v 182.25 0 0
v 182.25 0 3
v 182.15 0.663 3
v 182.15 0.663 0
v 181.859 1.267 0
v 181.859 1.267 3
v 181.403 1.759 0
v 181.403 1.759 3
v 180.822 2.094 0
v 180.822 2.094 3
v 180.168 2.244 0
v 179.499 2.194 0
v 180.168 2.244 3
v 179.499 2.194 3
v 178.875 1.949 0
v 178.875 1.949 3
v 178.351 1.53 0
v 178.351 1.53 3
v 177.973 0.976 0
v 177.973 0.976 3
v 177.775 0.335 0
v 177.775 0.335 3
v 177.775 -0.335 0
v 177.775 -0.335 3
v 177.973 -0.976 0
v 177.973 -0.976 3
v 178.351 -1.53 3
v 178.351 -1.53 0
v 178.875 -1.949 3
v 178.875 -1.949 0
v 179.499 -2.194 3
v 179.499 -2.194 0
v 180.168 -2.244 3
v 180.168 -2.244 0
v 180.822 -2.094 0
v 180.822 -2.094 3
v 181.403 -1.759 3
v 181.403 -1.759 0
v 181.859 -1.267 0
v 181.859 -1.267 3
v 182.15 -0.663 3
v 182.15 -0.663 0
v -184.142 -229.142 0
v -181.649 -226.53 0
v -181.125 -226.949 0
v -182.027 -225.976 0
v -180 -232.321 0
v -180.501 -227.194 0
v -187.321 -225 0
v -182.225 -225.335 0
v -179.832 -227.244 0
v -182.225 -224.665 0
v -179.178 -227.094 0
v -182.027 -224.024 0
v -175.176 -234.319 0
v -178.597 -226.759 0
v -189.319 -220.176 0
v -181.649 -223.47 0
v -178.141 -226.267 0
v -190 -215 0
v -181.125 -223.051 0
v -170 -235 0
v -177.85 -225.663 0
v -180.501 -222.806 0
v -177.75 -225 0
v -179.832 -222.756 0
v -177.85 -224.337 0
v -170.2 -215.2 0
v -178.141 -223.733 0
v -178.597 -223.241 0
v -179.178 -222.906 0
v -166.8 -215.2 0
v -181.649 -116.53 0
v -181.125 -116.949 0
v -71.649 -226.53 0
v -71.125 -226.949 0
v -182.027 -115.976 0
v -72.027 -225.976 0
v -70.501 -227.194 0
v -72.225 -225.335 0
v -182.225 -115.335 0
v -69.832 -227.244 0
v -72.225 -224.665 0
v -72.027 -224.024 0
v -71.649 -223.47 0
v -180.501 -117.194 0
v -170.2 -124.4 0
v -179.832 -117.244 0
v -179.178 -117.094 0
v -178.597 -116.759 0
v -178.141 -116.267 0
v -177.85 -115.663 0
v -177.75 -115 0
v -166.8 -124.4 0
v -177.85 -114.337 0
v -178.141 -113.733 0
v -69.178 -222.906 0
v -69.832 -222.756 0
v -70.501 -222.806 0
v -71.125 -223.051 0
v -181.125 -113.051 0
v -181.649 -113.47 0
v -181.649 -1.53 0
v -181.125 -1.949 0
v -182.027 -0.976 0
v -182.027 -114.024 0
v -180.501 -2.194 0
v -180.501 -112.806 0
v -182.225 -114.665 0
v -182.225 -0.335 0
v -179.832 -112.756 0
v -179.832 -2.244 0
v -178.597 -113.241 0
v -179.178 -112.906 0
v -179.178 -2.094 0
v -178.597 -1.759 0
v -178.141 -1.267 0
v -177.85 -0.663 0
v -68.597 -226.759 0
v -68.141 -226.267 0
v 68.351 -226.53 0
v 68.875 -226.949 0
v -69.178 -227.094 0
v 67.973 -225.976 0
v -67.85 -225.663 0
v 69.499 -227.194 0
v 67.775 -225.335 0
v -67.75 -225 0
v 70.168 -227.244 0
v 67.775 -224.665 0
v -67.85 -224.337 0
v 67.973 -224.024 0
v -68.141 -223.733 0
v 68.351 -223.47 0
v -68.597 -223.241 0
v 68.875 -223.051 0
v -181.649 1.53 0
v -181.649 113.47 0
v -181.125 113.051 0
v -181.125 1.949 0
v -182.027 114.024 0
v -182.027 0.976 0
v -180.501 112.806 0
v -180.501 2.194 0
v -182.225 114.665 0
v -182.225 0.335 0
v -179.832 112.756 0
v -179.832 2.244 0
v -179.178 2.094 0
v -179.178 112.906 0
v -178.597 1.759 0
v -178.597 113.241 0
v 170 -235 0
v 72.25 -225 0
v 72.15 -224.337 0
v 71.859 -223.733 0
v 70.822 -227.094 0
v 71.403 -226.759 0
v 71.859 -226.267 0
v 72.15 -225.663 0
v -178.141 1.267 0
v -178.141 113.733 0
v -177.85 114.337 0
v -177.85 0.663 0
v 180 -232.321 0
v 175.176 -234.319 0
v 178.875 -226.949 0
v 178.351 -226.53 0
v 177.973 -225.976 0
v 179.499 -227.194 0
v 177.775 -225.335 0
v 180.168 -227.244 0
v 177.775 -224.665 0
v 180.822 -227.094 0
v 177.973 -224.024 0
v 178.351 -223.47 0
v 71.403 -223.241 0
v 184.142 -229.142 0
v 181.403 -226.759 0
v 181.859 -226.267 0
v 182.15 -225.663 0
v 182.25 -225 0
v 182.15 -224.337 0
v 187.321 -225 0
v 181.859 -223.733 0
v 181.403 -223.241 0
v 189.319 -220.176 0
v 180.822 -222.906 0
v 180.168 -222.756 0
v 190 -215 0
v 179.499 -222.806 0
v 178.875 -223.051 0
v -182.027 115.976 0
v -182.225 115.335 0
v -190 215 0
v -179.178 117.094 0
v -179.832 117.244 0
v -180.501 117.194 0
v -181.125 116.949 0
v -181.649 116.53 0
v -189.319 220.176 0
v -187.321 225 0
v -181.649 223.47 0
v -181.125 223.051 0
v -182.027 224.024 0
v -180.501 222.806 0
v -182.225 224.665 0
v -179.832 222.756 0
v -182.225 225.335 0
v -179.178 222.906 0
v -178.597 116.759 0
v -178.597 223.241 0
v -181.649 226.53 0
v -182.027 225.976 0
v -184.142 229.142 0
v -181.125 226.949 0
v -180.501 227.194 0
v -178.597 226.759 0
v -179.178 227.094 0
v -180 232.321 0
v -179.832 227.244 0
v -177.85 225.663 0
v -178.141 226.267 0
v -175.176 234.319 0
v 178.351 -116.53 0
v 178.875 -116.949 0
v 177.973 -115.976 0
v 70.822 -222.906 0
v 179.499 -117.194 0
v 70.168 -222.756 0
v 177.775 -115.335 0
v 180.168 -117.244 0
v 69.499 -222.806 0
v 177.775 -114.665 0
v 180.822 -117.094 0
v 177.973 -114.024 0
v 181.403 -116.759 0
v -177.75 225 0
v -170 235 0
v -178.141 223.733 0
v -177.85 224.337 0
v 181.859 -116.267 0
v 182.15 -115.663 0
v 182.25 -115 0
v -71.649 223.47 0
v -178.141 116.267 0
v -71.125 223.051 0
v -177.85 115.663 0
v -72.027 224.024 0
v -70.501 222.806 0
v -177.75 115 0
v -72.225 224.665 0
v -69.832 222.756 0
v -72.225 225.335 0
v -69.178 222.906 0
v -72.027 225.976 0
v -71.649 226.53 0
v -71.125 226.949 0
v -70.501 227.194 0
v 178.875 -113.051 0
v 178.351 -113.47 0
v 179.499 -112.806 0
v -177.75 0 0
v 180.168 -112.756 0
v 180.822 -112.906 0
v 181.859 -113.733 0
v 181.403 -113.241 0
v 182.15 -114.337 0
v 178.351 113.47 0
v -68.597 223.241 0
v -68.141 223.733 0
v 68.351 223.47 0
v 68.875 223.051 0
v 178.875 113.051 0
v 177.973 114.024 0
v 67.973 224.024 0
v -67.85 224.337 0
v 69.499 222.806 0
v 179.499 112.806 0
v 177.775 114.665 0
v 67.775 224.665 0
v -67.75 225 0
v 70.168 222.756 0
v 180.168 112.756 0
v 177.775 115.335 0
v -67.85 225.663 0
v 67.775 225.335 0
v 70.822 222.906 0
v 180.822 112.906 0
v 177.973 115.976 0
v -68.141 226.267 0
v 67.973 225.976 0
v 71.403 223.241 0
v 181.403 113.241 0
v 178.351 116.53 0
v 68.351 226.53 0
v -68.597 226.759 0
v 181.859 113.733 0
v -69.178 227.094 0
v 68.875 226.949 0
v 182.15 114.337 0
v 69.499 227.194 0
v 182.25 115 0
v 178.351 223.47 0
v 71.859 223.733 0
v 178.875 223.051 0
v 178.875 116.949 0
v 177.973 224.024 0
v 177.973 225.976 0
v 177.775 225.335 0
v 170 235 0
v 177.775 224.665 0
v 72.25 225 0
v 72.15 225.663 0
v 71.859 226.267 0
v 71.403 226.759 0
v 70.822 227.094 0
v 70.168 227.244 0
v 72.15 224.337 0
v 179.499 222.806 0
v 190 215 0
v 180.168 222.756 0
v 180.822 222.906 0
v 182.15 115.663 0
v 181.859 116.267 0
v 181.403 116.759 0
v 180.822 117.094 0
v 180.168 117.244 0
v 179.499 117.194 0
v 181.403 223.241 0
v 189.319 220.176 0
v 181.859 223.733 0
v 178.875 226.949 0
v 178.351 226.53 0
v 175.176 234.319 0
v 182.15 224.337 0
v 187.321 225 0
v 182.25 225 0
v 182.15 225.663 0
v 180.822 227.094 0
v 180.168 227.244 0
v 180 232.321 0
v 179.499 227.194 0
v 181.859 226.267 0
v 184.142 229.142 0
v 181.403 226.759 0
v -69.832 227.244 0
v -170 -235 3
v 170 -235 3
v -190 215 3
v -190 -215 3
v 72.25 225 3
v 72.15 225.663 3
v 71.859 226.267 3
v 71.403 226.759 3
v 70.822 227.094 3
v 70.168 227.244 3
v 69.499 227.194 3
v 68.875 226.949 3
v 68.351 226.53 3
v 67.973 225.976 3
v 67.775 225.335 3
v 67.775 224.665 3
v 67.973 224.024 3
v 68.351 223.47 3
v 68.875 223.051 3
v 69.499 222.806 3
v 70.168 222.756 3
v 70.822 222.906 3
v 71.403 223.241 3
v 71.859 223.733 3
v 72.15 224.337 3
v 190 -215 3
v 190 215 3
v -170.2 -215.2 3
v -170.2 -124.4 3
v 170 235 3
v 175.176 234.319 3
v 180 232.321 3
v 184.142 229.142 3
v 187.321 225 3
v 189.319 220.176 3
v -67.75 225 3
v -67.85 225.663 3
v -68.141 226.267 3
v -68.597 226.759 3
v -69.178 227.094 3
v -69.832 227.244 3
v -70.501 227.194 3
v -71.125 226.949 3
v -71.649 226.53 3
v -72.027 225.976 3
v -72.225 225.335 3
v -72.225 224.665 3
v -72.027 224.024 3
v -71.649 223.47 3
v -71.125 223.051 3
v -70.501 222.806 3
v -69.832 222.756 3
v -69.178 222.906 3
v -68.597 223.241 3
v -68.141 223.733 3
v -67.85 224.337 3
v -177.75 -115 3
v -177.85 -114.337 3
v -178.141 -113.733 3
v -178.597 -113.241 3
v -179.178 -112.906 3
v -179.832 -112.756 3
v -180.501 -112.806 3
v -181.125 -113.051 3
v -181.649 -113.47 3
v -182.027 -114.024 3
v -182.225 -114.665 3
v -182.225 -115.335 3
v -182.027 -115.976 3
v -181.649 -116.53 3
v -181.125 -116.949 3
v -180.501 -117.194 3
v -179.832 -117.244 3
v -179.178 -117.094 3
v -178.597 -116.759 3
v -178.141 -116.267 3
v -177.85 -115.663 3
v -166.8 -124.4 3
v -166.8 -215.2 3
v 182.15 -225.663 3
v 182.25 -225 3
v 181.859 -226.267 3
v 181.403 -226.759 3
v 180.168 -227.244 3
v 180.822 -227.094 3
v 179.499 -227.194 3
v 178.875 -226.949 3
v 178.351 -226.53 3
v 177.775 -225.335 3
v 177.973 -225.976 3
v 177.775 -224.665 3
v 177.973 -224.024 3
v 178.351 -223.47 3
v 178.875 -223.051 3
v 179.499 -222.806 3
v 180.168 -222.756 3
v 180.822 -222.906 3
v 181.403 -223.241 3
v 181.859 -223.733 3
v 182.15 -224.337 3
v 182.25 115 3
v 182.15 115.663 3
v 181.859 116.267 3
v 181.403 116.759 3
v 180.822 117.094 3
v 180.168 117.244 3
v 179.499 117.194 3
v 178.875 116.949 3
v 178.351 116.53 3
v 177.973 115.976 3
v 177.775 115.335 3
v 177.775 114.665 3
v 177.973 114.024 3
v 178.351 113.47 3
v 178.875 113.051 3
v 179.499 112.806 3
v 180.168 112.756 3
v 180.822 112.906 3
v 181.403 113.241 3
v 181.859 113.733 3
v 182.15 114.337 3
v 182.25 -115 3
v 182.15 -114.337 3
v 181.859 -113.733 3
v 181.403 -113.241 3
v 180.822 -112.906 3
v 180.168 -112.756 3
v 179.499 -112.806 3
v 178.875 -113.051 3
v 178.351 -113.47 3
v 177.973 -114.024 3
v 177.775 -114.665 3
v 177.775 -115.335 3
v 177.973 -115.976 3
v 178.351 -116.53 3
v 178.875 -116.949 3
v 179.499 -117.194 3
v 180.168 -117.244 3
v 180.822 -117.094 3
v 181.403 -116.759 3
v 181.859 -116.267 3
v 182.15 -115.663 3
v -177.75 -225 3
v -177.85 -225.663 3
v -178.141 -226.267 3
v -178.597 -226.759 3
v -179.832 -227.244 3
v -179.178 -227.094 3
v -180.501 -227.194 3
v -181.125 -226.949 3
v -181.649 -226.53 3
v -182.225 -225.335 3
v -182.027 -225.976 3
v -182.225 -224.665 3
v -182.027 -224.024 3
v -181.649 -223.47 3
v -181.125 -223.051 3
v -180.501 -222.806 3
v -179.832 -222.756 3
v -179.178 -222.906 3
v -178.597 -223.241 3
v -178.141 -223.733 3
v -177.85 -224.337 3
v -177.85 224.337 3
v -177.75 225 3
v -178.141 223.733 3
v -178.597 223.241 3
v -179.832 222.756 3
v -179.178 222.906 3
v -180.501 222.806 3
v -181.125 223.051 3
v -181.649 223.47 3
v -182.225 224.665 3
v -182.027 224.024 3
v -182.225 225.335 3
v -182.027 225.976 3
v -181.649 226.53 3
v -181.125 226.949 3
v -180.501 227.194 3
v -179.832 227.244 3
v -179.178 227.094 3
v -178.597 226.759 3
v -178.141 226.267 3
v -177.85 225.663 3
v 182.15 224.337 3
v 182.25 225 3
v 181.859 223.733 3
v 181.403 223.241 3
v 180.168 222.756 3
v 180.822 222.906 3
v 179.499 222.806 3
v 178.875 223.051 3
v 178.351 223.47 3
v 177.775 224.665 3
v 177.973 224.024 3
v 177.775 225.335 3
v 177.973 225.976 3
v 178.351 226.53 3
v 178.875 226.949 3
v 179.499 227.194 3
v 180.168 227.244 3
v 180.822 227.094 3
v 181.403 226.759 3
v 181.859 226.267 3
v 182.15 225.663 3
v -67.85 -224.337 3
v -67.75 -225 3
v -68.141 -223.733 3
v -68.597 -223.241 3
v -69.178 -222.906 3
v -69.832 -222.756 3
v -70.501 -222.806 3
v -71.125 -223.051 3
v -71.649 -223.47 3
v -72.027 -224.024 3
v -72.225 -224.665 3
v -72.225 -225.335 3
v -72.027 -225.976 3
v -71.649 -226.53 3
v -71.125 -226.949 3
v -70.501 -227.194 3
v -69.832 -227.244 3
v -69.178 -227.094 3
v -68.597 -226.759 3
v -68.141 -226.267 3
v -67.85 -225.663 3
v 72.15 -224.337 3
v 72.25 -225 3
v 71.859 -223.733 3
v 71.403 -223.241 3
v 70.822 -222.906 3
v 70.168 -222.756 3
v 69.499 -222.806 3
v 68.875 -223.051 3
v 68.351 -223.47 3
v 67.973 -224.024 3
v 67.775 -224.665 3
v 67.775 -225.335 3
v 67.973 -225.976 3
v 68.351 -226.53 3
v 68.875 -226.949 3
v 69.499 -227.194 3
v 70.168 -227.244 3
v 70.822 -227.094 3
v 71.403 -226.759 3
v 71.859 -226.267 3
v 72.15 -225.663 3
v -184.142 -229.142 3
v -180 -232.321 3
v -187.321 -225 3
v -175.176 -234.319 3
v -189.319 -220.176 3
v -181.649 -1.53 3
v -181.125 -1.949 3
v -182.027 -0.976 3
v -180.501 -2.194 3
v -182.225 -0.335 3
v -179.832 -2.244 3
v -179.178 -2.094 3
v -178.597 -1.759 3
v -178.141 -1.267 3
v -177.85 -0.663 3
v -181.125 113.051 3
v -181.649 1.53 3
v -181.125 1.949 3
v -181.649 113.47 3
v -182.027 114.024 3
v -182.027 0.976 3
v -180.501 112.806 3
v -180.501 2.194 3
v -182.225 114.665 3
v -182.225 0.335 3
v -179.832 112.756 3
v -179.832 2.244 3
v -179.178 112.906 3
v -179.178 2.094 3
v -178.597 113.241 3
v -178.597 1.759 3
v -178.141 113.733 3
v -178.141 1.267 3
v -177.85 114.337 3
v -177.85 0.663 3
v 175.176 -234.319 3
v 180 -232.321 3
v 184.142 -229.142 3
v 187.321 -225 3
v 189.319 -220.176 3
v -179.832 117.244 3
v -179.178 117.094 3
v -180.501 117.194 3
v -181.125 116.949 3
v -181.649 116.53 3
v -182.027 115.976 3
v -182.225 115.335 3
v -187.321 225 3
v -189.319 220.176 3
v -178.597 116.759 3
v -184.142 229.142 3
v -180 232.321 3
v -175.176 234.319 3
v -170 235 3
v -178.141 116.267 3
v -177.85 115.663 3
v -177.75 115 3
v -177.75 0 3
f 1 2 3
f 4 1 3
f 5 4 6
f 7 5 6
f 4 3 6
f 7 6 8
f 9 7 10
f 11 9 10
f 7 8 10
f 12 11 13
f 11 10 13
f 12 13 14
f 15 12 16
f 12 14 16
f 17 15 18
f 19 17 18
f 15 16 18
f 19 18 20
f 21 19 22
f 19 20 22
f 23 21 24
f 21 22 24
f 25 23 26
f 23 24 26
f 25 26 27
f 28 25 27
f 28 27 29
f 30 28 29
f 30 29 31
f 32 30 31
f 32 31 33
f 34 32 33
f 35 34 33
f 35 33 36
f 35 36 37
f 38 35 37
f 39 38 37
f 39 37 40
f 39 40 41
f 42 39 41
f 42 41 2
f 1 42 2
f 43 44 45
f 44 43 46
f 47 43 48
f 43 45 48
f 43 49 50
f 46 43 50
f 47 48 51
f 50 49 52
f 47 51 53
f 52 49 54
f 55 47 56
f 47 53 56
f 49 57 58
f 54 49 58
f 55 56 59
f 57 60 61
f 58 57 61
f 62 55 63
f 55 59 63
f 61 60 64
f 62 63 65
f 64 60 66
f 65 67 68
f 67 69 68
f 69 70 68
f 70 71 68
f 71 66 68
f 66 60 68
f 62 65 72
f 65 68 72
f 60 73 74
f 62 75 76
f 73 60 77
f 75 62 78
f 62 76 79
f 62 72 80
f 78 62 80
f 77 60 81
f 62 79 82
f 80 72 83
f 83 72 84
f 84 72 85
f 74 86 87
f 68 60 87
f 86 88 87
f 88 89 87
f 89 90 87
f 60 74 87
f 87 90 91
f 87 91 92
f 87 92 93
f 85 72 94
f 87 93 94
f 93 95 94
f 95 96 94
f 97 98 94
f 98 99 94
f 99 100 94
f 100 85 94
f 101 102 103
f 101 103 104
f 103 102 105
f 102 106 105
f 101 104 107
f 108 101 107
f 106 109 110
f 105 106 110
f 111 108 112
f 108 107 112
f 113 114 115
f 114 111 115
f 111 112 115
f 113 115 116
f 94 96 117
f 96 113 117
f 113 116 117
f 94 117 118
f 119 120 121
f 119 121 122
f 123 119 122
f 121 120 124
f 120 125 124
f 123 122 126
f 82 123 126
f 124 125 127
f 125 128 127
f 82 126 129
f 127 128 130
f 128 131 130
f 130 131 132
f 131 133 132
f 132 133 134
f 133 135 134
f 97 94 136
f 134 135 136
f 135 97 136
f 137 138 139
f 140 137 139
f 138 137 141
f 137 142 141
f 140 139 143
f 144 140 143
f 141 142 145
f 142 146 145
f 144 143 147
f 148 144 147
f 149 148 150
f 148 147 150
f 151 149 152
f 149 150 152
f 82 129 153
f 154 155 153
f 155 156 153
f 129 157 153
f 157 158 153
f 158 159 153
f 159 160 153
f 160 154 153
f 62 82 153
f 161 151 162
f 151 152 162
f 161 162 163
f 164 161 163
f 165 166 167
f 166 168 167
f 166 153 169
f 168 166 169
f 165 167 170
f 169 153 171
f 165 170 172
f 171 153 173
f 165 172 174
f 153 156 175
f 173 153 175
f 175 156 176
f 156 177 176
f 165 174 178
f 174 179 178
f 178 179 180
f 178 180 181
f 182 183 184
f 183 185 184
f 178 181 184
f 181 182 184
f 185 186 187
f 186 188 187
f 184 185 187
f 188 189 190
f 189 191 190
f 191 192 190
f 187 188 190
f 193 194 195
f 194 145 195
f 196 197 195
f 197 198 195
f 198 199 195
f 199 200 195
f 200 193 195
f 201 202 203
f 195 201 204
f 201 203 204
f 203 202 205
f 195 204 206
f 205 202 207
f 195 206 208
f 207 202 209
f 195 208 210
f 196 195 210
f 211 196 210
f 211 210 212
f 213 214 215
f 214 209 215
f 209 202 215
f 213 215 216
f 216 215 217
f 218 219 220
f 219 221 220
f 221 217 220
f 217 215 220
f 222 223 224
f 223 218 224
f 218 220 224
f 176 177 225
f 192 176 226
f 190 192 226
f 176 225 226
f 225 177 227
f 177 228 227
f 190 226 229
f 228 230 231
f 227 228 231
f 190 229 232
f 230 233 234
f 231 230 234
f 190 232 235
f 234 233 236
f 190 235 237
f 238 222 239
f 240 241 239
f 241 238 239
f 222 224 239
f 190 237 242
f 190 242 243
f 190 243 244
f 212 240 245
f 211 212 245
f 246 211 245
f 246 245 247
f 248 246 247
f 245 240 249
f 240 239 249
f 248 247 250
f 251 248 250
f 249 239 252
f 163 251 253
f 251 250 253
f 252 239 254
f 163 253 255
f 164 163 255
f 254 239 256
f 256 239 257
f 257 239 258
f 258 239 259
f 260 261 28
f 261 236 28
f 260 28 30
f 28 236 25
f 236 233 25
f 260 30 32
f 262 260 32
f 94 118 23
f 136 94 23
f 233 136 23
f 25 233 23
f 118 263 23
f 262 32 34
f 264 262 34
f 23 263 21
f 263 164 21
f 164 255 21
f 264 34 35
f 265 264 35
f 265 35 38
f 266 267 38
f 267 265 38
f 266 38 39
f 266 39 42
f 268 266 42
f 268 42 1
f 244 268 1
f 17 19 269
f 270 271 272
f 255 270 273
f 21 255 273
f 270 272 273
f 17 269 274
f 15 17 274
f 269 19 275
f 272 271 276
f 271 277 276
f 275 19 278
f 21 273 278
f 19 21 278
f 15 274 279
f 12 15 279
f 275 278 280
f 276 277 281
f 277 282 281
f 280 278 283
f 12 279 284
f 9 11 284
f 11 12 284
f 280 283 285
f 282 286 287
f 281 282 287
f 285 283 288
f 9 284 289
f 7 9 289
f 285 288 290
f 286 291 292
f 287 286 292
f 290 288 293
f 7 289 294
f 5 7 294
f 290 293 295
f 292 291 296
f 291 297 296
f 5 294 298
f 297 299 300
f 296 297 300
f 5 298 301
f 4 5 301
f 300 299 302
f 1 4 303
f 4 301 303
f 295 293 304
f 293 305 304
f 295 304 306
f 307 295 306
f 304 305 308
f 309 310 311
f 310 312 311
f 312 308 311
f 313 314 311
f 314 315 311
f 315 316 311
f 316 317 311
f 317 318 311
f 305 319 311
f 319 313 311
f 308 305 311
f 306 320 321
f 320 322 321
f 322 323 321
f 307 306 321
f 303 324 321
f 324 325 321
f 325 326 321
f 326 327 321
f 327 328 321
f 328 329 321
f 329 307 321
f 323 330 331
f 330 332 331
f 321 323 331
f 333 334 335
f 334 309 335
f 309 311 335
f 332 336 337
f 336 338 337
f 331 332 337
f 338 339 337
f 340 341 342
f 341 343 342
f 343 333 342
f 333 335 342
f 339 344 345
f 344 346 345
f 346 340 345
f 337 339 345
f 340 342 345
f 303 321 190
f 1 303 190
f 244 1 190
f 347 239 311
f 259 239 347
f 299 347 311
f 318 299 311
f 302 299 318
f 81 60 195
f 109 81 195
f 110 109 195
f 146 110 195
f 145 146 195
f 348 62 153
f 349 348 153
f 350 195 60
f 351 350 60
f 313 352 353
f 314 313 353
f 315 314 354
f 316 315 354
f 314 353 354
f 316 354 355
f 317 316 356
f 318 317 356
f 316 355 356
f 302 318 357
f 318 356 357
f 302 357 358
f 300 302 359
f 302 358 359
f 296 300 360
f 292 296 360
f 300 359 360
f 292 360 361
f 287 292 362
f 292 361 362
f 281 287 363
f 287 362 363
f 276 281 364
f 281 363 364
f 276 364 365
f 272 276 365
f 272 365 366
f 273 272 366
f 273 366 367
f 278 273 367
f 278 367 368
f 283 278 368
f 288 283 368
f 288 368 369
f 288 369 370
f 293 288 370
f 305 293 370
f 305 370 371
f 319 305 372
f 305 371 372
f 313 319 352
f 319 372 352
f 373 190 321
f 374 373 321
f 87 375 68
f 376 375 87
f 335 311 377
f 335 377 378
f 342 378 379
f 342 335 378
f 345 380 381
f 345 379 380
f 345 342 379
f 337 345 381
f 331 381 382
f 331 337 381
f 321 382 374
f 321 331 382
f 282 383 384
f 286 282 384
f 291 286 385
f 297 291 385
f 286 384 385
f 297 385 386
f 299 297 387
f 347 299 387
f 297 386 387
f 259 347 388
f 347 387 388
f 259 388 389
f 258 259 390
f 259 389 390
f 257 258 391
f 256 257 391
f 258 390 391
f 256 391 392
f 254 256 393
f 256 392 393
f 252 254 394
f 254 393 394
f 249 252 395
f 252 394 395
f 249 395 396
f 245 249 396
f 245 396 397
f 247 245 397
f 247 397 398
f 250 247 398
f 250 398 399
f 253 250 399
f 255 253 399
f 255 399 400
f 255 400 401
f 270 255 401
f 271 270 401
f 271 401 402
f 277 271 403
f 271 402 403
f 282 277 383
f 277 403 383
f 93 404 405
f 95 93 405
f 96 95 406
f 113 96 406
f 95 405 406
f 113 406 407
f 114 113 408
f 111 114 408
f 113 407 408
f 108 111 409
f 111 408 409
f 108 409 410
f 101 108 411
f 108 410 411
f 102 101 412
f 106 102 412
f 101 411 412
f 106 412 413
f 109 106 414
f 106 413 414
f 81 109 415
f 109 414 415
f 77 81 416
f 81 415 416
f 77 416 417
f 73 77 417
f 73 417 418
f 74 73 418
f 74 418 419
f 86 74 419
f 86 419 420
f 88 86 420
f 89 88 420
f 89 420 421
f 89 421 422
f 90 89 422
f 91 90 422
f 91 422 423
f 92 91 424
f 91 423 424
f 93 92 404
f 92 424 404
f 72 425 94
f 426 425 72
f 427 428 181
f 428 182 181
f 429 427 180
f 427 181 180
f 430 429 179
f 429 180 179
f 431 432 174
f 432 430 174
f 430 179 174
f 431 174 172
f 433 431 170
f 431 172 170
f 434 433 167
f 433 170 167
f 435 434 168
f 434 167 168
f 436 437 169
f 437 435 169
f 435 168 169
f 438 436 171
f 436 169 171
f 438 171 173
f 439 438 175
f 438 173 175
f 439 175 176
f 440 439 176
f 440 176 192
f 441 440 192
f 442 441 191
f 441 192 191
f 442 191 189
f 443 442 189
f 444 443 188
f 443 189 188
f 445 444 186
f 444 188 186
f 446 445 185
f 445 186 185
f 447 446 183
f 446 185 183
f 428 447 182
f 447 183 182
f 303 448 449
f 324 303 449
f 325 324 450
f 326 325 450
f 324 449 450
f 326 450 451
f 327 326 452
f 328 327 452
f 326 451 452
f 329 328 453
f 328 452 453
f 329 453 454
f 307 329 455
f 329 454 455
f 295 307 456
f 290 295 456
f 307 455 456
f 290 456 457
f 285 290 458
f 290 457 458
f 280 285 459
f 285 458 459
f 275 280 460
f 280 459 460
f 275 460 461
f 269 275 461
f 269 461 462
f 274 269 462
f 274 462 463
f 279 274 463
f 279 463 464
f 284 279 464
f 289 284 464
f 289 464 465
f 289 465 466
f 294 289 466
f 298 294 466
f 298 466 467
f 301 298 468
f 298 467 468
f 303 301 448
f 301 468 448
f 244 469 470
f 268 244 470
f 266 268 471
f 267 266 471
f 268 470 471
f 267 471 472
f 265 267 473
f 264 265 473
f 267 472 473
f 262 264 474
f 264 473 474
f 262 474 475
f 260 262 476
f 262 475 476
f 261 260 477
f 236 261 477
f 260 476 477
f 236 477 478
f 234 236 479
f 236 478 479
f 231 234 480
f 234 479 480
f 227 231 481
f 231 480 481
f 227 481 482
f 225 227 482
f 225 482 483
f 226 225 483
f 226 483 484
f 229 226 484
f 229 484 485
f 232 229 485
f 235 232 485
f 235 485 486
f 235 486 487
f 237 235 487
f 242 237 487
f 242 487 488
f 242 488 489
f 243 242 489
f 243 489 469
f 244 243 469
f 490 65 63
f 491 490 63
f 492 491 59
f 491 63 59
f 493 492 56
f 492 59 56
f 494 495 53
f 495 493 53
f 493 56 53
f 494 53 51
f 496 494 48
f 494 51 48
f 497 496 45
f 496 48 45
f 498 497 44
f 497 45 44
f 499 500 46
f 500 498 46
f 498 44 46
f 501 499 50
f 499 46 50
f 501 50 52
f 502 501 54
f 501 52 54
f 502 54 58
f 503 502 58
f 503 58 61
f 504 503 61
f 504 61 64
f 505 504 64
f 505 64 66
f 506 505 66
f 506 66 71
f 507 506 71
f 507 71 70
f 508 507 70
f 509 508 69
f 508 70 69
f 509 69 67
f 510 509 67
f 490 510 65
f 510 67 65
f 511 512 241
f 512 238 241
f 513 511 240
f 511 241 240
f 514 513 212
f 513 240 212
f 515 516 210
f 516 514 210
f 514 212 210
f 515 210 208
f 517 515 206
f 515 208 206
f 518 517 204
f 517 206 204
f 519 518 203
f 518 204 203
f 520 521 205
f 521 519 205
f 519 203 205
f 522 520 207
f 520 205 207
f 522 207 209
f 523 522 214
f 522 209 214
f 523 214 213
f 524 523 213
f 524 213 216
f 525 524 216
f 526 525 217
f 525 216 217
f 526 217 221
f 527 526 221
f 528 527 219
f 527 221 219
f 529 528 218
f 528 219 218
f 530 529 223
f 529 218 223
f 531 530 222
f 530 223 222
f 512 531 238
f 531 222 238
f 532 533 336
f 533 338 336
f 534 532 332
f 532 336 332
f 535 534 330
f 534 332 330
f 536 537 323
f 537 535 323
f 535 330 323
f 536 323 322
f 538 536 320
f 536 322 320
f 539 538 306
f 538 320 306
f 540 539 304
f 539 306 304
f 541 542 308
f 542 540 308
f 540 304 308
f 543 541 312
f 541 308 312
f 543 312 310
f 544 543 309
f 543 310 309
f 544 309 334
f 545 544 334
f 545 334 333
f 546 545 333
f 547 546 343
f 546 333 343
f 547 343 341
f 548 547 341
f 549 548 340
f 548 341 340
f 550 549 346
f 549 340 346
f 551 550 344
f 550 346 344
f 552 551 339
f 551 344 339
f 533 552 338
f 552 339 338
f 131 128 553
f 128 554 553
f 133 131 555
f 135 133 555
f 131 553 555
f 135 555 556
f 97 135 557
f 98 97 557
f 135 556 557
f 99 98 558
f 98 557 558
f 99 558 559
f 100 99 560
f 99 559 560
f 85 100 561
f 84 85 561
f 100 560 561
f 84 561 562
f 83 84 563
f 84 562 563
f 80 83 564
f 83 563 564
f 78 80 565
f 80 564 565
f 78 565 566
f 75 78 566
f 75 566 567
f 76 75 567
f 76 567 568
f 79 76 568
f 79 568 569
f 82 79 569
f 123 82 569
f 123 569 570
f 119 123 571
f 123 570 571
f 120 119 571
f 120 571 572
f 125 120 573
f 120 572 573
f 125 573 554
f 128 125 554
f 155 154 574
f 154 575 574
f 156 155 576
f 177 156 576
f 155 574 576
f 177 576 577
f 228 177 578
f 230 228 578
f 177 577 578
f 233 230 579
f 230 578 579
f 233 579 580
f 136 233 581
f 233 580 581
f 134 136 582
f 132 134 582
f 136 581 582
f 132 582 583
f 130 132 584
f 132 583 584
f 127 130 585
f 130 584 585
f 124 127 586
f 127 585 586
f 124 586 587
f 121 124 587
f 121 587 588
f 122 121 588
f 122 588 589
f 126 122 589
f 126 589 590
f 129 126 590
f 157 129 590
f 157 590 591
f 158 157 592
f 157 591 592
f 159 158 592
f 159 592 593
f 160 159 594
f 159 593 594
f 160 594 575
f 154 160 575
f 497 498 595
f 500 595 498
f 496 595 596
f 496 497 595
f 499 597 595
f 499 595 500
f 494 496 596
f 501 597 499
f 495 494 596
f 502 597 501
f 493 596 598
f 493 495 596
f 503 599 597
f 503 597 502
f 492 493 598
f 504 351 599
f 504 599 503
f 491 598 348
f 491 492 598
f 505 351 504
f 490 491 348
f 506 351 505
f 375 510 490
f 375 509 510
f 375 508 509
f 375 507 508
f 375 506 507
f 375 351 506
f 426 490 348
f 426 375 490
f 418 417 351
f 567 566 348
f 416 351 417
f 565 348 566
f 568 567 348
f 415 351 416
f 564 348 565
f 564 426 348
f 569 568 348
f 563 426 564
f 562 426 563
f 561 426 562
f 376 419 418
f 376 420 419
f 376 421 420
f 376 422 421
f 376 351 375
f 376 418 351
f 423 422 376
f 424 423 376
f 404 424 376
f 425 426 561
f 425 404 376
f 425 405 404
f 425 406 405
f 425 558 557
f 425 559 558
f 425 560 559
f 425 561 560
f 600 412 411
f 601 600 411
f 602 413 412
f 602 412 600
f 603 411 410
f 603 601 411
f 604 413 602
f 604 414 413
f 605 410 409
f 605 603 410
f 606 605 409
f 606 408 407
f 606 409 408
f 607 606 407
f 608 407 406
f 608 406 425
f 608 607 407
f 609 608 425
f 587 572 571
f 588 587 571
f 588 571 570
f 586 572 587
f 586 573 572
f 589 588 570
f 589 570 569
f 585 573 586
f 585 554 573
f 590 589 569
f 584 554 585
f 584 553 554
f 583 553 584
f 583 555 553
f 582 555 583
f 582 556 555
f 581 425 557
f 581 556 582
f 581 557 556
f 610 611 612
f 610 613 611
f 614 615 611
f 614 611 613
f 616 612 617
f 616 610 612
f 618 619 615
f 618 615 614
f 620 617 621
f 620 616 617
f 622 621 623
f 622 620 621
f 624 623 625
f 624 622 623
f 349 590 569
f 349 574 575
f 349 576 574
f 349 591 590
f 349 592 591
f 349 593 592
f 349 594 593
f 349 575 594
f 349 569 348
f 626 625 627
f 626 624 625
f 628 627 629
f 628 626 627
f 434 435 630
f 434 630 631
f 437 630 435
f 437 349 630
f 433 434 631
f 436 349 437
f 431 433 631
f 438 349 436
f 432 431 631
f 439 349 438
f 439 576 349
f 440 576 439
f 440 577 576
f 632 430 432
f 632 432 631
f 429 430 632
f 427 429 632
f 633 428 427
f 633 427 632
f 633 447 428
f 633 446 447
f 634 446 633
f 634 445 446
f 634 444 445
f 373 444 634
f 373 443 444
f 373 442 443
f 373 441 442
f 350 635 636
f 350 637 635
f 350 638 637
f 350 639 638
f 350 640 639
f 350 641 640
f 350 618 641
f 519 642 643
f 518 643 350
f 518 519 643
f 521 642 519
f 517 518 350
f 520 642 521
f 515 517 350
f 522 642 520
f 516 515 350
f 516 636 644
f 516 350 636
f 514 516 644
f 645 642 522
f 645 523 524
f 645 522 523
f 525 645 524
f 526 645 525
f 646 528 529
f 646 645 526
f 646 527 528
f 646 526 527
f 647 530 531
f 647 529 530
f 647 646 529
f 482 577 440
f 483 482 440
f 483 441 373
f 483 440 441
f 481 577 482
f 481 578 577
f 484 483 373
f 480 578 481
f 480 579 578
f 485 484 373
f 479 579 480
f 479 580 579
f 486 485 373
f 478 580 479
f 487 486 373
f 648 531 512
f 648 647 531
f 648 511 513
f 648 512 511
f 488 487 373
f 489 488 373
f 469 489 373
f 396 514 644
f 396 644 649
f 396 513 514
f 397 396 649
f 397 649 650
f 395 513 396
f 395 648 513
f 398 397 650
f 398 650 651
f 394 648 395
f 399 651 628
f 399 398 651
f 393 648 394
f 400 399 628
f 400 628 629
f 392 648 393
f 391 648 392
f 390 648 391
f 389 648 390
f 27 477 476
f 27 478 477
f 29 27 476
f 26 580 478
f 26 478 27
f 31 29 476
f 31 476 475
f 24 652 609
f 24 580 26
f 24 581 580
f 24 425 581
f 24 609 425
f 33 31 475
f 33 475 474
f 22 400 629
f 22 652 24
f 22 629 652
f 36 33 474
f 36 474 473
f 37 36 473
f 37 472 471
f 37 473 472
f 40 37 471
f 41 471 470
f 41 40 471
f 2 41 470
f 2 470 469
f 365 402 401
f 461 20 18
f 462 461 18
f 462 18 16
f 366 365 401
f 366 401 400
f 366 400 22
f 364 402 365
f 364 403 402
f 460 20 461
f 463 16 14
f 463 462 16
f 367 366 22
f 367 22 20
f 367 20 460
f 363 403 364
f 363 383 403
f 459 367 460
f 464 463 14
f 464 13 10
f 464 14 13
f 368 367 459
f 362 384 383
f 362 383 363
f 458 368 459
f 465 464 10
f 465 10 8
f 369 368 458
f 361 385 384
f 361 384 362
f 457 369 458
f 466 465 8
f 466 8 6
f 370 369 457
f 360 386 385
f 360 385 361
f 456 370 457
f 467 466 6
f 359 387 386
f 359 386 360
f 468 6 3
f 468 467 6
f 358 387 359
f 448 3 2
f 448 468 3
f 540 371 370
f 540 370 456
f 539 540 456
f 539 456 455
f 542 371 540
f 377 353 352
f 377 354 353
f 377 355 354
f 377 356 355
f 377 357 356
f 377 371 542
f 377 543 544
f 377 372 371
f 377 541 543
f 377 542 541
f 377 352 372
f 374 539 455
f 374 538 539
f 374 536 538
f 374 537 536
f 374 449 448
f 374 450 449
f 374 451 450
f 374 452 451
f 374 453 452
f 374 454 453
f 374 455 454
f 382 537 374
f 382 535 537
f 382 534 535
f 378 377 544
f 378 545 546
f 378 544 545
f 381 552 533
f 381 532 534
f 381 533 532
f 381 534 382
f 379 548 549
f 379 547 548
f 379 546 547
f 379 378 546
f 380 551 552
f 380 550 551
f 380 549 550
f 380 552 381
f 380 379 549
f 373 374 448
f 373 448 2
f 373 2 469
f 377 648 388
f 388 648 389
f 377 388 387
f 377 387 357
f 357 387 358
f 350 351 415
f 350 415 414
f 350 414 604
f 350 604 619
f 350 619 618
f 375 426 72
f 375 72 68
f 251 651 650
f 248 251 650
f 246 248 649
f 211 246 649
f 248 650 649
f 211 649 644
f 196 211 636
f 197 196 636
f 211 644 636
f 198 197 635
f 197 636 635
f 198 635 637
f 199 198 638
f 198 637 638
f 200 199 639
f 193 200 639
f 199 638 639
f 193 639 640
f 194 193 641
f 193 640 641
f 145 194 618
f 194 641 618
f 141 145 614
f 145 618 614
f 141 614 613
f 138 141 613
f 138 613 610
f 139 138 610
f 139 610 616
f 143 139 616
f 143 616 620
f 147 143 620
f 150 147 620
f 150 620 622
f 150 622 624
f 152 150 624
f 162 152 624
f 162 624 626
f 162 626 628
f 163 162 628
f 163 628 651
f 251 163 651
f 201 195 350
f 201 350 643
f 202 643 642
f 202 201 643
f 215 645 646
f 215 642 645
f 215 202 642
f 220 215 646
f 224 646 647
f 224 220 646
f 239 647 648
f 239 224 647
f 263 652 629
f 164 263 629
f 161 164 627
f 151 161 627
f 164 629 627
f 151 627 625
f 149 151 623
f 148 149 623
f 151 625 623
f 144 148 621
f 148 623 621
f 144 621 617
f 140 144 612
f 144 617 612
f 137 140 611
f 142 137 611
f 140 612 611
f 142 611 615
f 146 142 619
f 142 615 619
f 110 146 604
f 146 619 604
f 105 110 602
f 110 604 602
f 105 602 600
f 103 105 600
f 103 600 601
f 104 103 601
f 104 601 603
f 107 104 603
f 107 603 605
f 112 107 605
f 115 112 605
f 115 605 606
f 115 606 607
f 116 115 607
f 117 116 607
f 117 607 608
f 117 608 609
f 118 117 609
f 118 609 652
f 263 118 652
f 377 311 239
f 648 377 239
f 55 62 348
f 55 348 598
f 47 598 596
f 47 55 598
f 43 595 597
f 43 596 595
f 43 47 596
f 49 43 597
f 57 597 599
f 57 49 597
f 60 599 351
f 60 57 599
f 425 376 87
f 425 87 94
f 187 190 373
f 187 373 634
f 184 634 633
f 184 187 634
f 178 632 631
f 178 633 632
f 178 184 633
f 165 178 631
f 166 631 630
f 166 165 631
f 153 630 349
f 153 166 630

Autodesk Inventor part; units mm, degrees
ref_plane "YZ Plane" through (0, 0, 0) normal (1, 0, 0) x (0, 1, 0)
ref_plane "XZ Plane" through (0, 0, 0) normal (0, 1, 0) x (-1, 0, 0)
ref_plane "XY Plane" through (0, 0, 0) normal (0, 0, 1) x (1, 0, 0)
sketch "スケッチ1" plane through (0, 0, 0) normal (0, 0, 1) x (1, 0, 0)
  line L0 (-170, -235) -> (170, -235)
  line L1 (190, -215) -> (190, 215)
  line L2 (170, 235) -> (-170, 235)
  line L3 (-190, 215) -> (-190, -215)
  line L4 (-190, -235) -> (190, 235) construction
  line L5 (190, -235) -> (-190, 235) construction
  circle A0 centre (-180, 225) radius 2.25
  circle A1 centre (180, 225) radius 2.25
  circle A2 centre (-180, -225) radius 2.25
  circle A3 centre (180, -225) radius 2.25
  arc A4 (-170, 235) -> (-190, 215) centre (-170, 215) ccw
  arc A5 (190, 215) -> (170, 235) centre (170, 215) ccw
  arc A6 (170, -235) -> (190, -215) centre (170, -215) ccw
  arc A7 (-190, -215) -> (-170, -235) centre (-170, -215) ccw
  point P0 (0, 0)
  dimension "d0" = 380
  dimension "d1" = 470
  dimension "d2" = 4.5
  dimension "d3" = 10
  dimension "d4" = 10
  dimension "d5" = 10
  dimension "d6" = 10
  dimension "d7" = 10
  dimension "d8" = 10
  dimension "d9" = 10
  dimension "d10" = 10
  dimension "d11" = 20
extrude "押し出し1" add sketch "スケッチ1" along normal blind 3
sketch "スケッチ2" plane through (0, 0, 3) normal (0, 0, 1) x (1, 0, 0)
  circle A0 centre (-180, -225) radius 2.25 construction
  circle A1 centre (-180, -115) radius 2.25
  line L0 (-190, 215) -> (-190, -215) projected
  point P0 (0, 0)
  dimension "d14" = 110
  dimension "d15" = 10
extrude "押し出し2" cut sketch "スケッチ2" against normal blind 10
sketch "スケッチ3" plane through (0, 0, 3) normal (0, 0, 1) x (1, 0, 0)
  line L0 (-167, -124.6) -> (-167, -215) construction
  line L1 (-170, -124.6) -> (-167, -124.6) construction
  line L2 (-170, -215) -> (-170, -124.6) construction
  line L3 (-170, -215) -> (-167, -215) construction
  line L4 (-170.2, -124.4) -> (-166.8, -124.4)
  line L5 (-166.8, -124.4) -> (-166.8, -215.2)
  line L6 (-166.8, -215.2) -> (-170.2, -215.2)
  line L7 (-170.2, -215.2) -> (-170.2, -124.4)
  point P0 (0, 0)
  dimension "d18" = 0.2
extrude "押し出し3" cut sketch "スケッチ3" against normal up to surface (3 mm away)
sketch "スケッチ4" plane through (0, 0, 3) normal (0, 0, 1) x (1, 0, 0)
  circle A0 centre (-180, -225) radius 2.25 construction
  circle A1 centre (-180, -115) radius 2.25 construction
  circle A2 centre (180, -225) radius 2.25 construction
  circle A3 centre (-180, 225) radius 2.25 construction
  circle A4 centre (180, 225) radius 2.25 construction
  circle A5 centre (-180, -225) radius 2.25 construction
  circle A6 centre (-180, -115) radius 2.25 construction
  circle A7 centre (-180, -225) radius 110 construction
  circle A8 centre (-180, 225) radius 2.25 construction
  circle A9 centre (-180, 225) radius 110 construction
  circle A10 centre (180, 225) radius 110 construction
  circle A11 centre (180, -225) radius 110 construction
  line L0 (-180, -225) -> (180, -225) construction
  line L1 (180, -225) -> (180, 225) construction
  line L2 (180, 225) -> (-180, 225) construction
  line L3 (-180, 225) -> (-180, -225) construction
  line L4 (-180, 0) -> (180, 0) construction
  circle A12 centre (-180, 115) radius 2.25
  circle A13 centre (-180, 0) radius 2.25
  circle A14 centre (-70, -225) radius 2.25
  circle A15 centre (70, -225) radius 2.25
  circle A16 centre (180, -115) radius 2.25
  circle A17 centre (180, 115) radius 2.25
  circle A18 centre (70, 225) radius 2.25
  circle A19 centre (-70, 225) radius 2.25
  circle A20 centre (180, 0) radius 2.25
  point P0 (0, 0)
extrude "押し出し4" cut sketch "スケッチ4" against normal up to surface (3 mm away)
equation "\"d5\" = d3"
equation "\"d6\" = d4"
equation "\"d7\" = d6"
equation "\"d8\" = d5"
equation "\"d9\" = d8"
equation "\"d10\" = d7"
properties part number "left_panel" material "アルミニウム 6061"
